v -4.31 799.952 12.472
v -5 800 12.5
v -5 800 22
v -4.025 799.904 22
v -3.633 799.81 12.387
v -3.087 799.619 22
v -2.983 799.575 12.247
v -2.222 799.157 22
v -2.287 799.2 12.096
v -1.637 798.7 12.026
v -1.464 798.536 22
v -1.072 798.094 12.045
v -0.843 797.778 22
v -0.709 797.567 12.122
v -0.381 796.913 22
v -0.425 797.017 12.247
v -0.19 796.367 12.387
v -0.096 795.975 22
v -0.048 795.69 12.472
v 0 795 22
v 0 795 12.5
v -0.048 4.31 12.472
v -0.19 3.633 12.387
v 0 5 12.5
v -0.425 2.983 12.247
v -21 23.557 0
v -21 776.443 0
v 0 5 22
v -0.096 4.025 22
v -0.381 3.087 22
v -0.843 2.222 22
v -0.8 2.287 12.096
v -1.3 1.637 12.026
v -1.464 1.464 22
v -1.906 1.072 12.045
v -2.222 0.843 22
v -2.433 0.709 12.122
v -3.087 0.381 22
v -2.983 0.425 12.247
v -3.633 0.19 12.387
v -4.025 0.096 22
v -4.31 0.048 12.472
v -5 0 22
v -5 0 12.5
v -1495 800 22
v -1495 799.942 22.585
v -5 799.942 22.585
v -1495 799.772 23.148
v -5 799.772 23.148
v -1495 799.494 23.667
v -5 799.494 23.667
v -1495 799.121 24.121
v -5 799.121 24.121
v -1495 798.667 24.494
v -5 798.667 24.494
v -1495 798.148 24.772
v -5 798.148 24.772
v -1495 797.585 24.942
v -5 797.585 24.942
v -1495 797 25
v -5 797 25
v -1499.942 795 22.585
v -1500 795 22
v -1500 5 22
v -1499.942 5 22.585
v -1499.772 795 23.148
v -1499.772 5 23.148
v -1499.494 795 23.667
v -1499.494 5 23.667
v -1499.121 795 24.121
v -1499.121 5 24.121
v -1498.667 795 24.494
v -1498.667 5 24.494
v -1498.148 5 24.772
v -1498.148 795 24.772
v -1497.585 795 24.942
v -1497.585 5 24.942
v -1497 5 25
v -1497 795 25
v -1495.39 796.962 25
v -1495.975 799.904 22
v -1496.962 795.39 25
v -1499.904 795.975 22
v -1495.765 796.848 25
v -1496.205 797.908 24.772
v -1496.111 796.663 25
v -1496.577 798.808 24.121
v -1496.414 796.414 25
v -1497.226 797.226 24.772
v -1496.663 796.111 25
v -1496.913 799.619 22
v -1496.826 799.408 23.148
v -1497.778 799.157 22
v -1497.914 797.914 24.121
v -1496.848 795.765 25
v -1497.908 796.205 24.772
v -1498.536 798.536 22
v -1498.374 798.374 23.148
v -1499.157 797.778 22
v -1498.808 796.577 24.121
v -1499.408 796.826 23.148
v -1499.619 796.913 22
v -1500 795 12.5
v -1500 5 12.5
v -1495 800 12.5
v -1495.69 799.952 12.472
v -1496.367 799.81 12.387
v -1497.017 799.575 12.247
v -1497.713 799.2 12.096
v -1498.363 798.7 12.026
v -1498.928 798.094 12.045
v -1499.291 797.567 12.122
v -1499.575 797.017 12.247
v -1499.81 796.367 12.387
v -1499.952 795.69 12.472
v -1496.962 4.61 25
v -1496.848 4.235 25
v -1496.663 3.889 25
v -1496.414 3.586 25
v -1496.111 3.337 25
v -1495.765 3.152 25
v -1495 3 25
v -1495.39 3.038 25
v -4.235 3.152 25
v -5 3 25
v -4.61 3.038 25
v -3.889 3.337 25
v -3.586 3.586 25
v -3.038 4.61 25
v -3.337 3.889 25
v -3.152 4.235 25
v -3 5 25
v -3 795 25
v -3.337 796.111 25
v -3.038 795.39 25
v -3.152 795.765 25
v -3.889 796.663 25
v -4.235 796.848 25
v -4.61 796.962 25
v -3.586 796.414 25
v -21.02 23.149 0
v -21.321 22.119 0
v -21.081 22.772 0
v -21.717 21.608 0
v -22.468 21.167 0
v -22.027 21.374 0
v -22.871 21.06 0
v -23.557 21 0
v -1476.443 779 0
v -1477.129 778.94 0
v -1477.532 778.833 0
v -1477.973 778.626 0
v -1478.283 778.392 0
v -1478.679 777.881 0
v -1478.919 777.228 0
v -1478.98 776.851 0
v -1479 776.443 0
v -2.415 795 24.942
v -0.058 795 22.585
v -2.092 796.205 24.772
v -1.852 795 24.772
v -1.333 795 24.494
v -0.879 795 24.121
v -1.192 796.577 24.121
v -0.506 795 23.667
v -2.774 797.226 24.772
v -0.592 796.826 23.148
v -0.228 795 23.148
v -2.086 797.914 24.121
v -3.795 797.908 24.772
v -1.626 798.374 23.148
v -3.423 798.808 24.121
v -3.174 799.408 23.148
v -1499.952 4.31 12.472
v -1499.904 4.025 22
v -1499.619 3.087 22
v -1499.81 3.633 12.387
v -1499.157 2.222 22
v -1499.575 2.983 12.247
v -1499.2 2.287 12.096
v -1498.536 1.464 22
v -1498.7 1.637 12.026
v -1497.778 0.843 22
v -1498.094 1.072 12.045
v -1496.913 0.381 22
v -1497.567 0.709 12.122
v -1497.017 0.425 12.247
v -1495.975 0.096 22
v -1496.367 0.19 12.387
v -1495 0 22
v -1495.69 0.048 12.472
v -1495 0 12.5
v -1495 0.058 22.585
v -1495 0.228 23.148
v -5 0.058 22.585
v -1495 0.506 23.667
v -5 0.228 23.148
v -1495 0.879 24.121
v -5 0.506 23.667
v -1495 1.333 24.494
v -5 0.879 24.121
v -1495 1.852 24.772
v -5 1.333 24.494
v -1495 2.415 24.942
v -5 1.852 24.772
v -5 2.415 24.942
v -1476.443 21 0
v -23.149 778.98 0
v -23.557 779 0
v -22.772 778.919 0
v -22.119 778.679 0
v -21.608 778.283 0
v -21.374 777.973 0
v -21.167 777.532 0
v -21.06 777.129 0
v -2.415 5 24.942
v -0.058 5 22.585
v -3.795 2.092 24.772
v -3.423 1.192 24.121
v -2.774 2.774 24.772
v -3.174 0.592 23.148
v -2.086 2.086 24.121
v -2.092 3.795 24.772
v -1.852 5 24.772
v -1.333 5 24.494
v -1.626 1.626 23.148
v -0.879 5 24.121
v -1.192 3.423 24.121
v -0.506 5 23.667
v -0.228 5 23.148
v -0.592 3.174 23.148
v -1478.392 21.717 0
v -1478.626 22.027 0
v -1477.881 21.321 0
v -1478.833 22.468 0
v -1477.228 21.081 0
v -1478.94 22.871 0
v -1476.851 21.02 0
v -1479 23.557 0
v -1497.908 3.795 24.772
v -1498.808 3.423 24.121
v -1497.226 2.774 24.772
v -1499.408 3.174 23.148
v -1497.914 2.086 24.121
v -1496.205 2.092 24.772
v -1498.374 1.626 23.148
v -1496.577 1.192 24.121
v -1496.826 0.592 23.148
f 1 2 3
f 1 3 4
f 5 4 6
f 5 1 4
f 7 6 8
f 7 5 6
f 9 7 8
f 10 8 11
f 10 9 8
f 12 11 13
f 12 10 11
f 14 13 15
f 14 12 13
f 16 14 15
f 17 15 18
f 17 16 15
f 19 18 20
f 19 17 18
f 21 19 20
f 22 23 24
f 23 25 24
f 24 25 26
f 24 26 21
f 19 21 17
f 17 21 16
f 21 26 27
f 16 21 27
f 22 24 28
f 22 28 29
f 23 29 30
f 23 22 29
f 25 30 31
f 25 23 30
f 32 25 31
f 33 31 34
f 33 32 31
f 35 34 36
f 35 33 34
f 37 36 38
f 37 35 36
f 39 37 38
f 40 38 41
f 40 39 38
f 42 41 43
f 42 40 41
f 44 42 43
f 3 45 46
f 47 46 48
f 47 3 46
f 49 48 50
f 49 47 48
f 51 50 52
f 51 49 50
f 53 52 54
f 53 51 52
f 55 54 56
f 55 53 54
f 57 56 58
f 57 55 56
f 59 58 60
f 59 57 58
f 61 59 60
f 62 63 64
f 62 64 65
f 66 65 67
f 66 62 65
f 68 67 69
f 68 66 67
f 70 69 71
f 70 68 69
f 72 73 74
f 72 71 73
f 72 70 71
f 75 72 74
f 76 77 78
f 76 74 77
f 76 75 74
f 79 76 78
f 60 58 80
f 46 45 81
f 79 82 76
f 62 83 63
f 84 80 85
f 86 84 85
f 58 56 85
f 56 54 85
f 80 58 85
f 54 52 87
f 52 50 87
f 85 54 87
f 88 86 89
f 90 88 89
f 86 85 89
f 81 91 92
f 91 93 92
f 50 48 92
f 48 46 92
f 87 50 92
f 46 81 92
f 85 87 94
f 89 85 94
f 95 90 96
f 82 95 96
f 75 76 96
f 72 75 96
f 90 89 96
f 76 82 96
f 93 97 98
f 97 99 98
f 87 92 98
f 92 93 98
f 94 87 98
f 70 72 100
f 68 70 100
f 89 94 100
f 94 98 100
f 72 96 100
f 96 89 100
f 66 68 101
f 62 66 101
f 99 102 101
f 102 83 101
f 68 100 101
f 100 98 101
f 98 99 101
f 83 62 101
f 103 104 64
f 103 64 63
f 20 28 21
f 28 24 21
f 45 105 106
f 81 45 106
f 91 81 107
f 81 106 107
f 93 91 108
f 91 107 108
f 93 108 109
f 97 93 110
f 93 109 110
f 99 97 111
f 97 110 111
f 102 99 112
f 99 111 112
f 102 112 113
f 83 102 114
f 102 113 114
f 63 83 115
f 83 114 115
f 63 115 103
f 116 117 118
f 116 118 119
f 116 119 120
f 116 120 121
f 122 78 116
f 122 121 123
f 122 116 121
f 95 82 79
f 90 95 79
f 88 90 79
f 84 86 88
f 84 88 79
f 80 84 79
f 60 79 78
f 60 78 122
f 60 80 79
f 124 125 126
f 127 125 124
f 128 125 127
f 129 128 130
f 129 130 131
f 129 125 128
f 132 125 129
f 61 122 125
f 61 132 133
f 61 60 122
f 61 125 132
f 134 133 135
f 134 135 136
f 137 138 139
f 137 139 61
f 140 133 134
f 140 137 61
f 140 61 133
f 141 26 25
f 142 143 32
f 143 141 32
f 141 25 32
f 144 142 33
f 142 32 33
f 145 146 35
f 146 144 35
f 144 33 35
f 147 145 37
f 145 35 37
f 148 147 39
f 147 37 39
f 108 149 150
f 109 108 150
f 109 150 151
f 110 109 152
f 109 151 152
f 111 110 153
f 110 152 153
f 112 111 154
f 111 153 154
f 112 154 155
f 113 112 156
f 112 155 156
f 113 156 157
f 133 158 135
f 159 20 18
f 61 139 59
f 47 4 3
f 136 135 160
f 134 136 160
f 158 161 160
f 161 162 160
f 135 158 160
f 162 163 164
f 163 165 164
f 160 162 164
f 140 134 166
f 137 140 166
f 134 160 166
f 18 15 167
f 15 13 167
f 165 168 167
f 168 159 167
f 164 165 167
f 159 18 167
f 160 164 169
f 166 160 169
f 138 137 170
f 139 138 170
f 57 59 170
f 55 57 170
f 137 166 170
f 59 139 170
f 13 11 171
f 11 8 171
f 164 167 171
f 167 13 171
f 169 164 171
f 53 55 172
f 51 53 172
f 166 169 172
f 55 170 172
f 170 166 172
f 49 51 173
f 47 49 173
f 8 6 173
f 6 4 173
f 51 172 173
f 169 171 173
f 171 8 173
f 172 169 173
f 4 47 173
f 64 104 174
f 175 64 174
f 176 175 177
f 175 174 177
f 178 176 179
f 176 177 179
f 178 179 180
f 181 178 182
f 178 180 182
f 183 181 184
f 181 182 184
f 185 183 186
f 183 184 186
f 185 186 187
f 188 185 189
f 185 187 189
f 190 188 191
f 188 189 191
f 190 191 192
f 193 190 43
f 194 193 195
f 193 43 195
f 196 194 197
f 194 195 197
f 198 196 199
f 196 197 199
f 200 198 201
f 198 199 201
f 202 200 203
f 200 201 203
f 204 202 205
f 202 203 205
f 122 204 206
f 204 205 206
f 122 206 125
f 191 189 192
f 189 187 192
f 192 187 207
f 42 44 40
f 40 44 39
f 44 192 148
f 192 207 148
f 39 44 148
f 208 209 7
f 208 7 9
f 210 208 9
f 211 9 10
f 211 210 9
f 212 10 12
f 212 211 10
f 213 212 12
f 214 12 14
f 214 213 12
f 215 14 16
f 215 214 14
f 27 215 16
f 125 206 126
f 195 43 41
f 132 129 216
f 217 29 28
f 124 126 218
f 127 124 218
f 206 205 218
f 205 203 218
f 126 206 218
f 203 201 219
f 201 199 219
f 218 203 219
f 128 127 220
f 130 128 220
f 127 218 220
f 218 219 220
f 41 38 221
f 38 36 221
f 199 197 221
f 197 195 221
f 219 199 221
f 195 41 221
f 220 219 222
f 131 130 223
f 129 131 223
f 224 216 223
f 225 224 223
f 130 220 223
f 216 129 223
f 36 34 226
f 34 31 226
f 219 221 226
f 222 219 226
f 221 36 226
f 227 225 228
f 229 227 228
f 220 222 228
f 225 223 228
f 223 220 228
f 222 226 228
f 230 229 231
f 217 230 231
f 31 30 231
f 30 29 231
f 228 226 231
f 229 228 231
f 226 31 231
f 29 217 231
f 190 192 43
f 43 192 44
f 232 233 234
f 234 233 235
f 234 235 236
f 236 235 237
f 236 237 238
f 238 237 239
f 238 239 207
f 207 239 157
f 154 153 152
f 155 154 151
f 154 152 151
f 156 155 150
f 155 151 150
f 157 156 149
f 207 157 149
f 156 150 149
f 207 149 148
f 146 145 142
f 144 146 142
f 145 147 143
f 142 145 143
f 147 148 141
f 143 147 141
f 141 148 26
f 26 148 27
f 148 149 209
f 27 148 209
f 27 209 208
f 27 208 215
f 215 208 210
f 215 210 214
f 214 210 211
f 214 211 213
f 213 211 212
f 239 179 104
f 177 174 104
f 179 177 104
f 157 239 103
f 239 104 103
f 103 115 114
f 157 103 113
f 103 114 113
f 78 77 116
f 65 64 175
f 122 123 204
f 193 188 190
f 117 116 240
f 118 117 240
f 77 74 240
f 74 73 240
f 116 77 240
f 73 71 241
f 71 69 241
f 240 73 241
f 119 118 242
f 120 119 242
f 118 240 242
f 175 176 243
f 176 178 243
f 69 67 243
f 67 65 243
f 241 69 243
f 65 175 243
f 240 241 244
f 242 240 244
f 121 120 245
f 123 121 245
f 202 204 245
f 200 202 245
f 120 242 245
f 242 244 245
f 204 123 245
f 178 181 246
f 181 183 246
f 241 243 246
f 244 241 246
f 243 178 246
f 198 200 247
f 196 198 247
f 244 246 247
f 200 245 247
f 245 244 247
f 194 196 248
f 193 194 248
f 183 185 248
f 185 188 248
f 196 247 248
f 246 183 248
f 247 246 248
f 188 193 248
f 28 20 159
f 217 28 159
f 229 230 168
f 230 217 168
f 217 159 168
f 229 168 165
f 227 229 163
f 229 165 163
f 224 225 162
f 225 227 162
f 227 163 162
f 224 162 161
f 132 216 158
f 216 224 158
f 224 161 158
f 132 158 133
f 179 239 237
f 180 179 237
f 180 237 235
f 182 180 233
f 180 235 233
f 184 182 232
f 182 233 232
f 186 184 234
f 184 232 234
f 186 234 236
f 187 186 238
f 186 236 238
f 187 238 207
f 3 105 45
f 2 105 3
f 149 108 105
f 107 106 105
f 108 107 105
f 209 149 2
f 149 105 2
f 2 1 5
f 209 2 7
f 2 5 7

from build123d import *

# Parameters (mm, degrees)
F0_W         = 1500
F0_H         = 800
F1_DEPTH     = 25
F2_C1_SIZE2  = 21
F2_C1_SIZE   = 12.5
F2_C2_SIZE2  = 21
F2_C2_SIZE   = 12.5
F2_C3_SIZE2  = 12.5
F2_C3_SIZE   = 21
F2_C4_SIZE2  = 12.5
F2_C4_SIZE   = 21
F3_R         = 3
F4_T1_DEPTH  = 25
F4_T3_DEPTH  = 41.9202637387
F4_T5_DEPTH  = 41.9202637387
F4_T7_DEPTH  = 41.9202637387
F4_T9_DEPTH  = 41.9202637387
F4_T12_ANGLE = 90
F4_T14_ANGLE = 90
F4_T16_ANGLE = 90
F4_T18_ANGLE = 90


# Not quite as in the source:
# - a fillet or chamfer that OpenCascade refuses, or shapes differently, is made with other operations: its cross-section is extruded or revolved along the edge and cut away or added


with BuildPart() as f1:
    # F0 (on Top) → F1 (new body)
    with BuildSketch(Plane.XY):
        with Locations((-750, 400)):
            Rectangle(F0_W, F0_H)
    extrude(amount=F1_DEPTH)

    # F2: chamfer of 21 x 12.5 on 4 edges, made by hand

    # F2_c1
    f2_c1_edges = [f1.edges().sort_by_distance(p)[0] for p in [
        (-750, 0, 0),
    ]]
    f2_c1_side = f1.faces().sort_by_distance((-750, 0, 0.25))[0]
    chamfer(f2_c1_edges, length=F2_C1_SIZE, length2=F2_C1_SIZE2, reference=f2_c1_side)

    # F2_c2
    f2_c2_edges = [f1.edges().sort_by_distance(p)[0] for p in [
        (0, 410.5, 0),
    ]]
    f2_c2_side = f1.faces().sort_by_distance((0, 410.5, 0.25))[0]
    chamfer(f2_c2_edges, length=F2_C2_SIZE, length2=F2_C2_SIZE2, reference=f2_c2_side)

    # F2_c3
    f2_c3_edges = [f1.edges().sort_by_distance(p)[0] for p in [
        (-760.5, 800, 0),
    ]]
    f2_c3_side = f1.faces().sort_by_distance((-760.5, 799.75, 0))[0]
    chamfer(f2_c3_edges, length=F2_C3_SIZE, length2=F2_C3_SIZE2, reference=f2_c3_side)

    # F2_c4
    f2_c4_edges = [f1.edges().sort_by_distance(p)[0] for p in [
        (-1500, 400, 0),
    ]]
    f2_c4_side = f1.faces().sort_by_distance((-1499.75, 400, 0))[0]
    chamfer(f2_c4_edges, length=F2_C4_SIZE, length2=F2_C4_SIZE2, reference=f2_c4_side)

    # F3
    f3_edges = [f1.edges().sort_by_distance(p)[0] for p in [
        (-750, 0, 25),
        (0, 400, 25),
        (-750, 800, 25),
        (-1500, 400, 25),
    ]]
    fillet(f3_edges, radius=F3_R)

    # F4: fillet of radius 5 on 8 edges, made by hand

    # F4_s2 → F4_t1 (cut)
    with BuildSketch(Plane.XY):
        with BuildLine():
            ThreePointArc((-1500, 5), (-1498.5355339059, 1.4644660941), (-1495, 0))
            Line((-1495, 0), (-1500, 0))
            Line((-1500, 0), (-1500, 5))
        make_face()
        with BuildLine():
            ThreePointArc((-1495, 800), (-1498.5355339059, 798.5355339059), (-1500, 795))
            Line((-1500, 795), (-1500, 800))
            Line((-1500, 800), (-1495, 800))
        make_face()
        with BuildLine():
            ThreePointArc((-5, 800), (-1.4644660941, 798.5355339059), (0, 795))
            Line((0, 795), (0, 800))
            Line((0, 800), (-5, 800))
        make_face()
        with BuildLine():
            ThreePointArc((0, 5), (-1.4644660941, 1.4644660941), (-5, 0))
            Line((-5, 0), (0, 0))
            Line((0, 0), (0, 5))
        make_face()
    extrude(amount=F4_T1_DEPTH, mode=Mode.SUBTRACT)

    # F4_s4 → F4_t3 (cut)
    with BuildSketch(Plane(origin=(-616.1297856971, -616.1297856971, 366.7439200578), x_dir=(0.7071067812, -0.7071067812, 0), z_dir=(-0.6517309188, -0.6517309188, 0.3879350707))):
        with BuildLine():
            ThreePointArc((-1062.4685403084, -399.2446653395), (-1060.6601717798, -399.5831416331), (-1058.8518032513, -399.2446653395))
            Line((-1058.8518032513, -399.2446653395), (-1060.6601717798, -399.9461949124))
            Line((-1060.6601717798, -399.9461949124), (-1062.4685403084, -399.2446653395))
        make_face()
    extrude(amount=F4_T3_DEPTH, mode=Mode.SUBTRACT)

    # F4_s6 → F4_t5 (cut)
    with BuildSketch(Plane(origin=(-955.9323380689, 955.9323380689, 569.0073440886), x_dir=(-0.7071067812, -0.7071067812, 0), z_dir=(-0.6517309188, 0.6517309188, 0.3879350707))):
        with BuildLine():
            ThreePointArc((493.166378302, -618.693880655), (494.9747468306, -619.0323569486), (496.7831153591, -618.693880655))
            Line((496.7831153591, -618.693880655), (494.9747468306, -619.3954102279))
            Line((494.9747468306, -619.3954102279), (493.166378302, -618.693880655))
        make_face()
    extrude(amount=F4_T5_DEPTH, mode=Mode.SUBTRACT)

    # F4_s8 → F4_t7 (cut)
    with BuildSketch(Plane(origin=(318.8025523718, 318.8025523718, 189.7634240308), x_dir=(-0.7071067812, 0.7071067812, 0), z_dir=(0.6517309188, 0.6517309188, 0.3879350707))):
        with BuildLine():
            ThreePointArc((567.4937934778, -207.2266019385), (565.6854249492, -207.5650782321), (563.8770564207, -207.2266019385))
            Line((563.8770564207, -207.2266019385), (565.6854249492, -207.9281315114))
            Line((565.6854249492, -207.9281315114), (567.4937934778, -207.2266019385))
        make_face()
    extrude(amount=F4_T7_DEPTH, mode=Mode.SUBTRACT)

    # F4_s10 → F4_t9 (cut)
    with BuildSketch(Plane(origin=(6.320732001, -6.320732001, 3.7623404768), x_dir=(-0.7071067812, -0.7071067812, 0), z_dir=(-0.6517309188, 0.6517309188, -0.3879350707))):
        with BuildLine():
            ThreePointArc((-1.8083685285, 12.222613377), (0, 11.8841370834), (1.8083685285, 12.222613377))
            Line((1.8083685285, 12.222613377), (0, 11.5210838041))
            Line((0, 11.5210838041), (-1.8083685285, 12.222613377))
        make_face()
    extrude(amount=F4_T9_DEPTH, mode=Mode.SUBTRACT)

    # F4_s11 → F4_t12 (revolve, cut)
    with BuildSketch(Plane.YZ.offset(-5)):
        with BuildLine():
            ThreePointArc((3, 25), (0.8786796564, 24.1213203436), (0, 22))
            Line((0, 22), (0, 25))
            Line((0, 25), (3, 25))
        make_face()
    revolve(axis=Axis((-5, 5, 25), (0, 0, 1)), revolution_arc=F4_T12_ANGLE, mode=Mode.SUBTRACT)

    # F4_s13 → F4_t14 (revolve, cut)
    with BuildSketch(Plane.XZ.offset(-795)):
        with BuildLine():
            ThreePointArc((-3, 25), (-0.8786796564, 24.1213203436), (0, 22))
            Line((0, 22), (0, 25))
            Line((0, 25), (-3, 25))
        make_face()
    revolve(axis=Axis((-5, 795, 25), (0, 0, 1)), revolution_arc=F4_T14_ANGLE, mode=Mode.SUBTRACT)

    # F4_s15 → F4_t16 (revolve, cut)
    with BuildSketch(Plane.YZ.offset(-1495)):
        with BuildLine():
            ThreePointArc((797, 25), (799.1213203436, 24.1213203436), (800, 22))
            Line((800, 22), (800, 25))
            Line((800, 25), (797, 25))
        make_face()
    revolve(axis=Axis((-1495, 795, 25), (0, 0, 1)), revolution_arc=F4_T16_ANGLE, mode=Mode.SUBTRACT)

    # F4_s17 → F4_t18 (revolve, cut)
    with BuildSketch(Plane.XZ.offset(-5)):
        with BuildLine():
            ThreePointArc((-1497, 25), (-1499.1213203436, 24.1213203436), (-1500, 22))
            Line((-1500, 22), (-1500, 25))
            Line((-1500, 25), (-1497, 25))
        make_face()
    revolve(axis=Axis((-1495, 5, 25), (0, 0, 1)), revolution_arc=F4_T18_ANGLE, mode=Mode.SUBTRACT)


solid = f1.part
